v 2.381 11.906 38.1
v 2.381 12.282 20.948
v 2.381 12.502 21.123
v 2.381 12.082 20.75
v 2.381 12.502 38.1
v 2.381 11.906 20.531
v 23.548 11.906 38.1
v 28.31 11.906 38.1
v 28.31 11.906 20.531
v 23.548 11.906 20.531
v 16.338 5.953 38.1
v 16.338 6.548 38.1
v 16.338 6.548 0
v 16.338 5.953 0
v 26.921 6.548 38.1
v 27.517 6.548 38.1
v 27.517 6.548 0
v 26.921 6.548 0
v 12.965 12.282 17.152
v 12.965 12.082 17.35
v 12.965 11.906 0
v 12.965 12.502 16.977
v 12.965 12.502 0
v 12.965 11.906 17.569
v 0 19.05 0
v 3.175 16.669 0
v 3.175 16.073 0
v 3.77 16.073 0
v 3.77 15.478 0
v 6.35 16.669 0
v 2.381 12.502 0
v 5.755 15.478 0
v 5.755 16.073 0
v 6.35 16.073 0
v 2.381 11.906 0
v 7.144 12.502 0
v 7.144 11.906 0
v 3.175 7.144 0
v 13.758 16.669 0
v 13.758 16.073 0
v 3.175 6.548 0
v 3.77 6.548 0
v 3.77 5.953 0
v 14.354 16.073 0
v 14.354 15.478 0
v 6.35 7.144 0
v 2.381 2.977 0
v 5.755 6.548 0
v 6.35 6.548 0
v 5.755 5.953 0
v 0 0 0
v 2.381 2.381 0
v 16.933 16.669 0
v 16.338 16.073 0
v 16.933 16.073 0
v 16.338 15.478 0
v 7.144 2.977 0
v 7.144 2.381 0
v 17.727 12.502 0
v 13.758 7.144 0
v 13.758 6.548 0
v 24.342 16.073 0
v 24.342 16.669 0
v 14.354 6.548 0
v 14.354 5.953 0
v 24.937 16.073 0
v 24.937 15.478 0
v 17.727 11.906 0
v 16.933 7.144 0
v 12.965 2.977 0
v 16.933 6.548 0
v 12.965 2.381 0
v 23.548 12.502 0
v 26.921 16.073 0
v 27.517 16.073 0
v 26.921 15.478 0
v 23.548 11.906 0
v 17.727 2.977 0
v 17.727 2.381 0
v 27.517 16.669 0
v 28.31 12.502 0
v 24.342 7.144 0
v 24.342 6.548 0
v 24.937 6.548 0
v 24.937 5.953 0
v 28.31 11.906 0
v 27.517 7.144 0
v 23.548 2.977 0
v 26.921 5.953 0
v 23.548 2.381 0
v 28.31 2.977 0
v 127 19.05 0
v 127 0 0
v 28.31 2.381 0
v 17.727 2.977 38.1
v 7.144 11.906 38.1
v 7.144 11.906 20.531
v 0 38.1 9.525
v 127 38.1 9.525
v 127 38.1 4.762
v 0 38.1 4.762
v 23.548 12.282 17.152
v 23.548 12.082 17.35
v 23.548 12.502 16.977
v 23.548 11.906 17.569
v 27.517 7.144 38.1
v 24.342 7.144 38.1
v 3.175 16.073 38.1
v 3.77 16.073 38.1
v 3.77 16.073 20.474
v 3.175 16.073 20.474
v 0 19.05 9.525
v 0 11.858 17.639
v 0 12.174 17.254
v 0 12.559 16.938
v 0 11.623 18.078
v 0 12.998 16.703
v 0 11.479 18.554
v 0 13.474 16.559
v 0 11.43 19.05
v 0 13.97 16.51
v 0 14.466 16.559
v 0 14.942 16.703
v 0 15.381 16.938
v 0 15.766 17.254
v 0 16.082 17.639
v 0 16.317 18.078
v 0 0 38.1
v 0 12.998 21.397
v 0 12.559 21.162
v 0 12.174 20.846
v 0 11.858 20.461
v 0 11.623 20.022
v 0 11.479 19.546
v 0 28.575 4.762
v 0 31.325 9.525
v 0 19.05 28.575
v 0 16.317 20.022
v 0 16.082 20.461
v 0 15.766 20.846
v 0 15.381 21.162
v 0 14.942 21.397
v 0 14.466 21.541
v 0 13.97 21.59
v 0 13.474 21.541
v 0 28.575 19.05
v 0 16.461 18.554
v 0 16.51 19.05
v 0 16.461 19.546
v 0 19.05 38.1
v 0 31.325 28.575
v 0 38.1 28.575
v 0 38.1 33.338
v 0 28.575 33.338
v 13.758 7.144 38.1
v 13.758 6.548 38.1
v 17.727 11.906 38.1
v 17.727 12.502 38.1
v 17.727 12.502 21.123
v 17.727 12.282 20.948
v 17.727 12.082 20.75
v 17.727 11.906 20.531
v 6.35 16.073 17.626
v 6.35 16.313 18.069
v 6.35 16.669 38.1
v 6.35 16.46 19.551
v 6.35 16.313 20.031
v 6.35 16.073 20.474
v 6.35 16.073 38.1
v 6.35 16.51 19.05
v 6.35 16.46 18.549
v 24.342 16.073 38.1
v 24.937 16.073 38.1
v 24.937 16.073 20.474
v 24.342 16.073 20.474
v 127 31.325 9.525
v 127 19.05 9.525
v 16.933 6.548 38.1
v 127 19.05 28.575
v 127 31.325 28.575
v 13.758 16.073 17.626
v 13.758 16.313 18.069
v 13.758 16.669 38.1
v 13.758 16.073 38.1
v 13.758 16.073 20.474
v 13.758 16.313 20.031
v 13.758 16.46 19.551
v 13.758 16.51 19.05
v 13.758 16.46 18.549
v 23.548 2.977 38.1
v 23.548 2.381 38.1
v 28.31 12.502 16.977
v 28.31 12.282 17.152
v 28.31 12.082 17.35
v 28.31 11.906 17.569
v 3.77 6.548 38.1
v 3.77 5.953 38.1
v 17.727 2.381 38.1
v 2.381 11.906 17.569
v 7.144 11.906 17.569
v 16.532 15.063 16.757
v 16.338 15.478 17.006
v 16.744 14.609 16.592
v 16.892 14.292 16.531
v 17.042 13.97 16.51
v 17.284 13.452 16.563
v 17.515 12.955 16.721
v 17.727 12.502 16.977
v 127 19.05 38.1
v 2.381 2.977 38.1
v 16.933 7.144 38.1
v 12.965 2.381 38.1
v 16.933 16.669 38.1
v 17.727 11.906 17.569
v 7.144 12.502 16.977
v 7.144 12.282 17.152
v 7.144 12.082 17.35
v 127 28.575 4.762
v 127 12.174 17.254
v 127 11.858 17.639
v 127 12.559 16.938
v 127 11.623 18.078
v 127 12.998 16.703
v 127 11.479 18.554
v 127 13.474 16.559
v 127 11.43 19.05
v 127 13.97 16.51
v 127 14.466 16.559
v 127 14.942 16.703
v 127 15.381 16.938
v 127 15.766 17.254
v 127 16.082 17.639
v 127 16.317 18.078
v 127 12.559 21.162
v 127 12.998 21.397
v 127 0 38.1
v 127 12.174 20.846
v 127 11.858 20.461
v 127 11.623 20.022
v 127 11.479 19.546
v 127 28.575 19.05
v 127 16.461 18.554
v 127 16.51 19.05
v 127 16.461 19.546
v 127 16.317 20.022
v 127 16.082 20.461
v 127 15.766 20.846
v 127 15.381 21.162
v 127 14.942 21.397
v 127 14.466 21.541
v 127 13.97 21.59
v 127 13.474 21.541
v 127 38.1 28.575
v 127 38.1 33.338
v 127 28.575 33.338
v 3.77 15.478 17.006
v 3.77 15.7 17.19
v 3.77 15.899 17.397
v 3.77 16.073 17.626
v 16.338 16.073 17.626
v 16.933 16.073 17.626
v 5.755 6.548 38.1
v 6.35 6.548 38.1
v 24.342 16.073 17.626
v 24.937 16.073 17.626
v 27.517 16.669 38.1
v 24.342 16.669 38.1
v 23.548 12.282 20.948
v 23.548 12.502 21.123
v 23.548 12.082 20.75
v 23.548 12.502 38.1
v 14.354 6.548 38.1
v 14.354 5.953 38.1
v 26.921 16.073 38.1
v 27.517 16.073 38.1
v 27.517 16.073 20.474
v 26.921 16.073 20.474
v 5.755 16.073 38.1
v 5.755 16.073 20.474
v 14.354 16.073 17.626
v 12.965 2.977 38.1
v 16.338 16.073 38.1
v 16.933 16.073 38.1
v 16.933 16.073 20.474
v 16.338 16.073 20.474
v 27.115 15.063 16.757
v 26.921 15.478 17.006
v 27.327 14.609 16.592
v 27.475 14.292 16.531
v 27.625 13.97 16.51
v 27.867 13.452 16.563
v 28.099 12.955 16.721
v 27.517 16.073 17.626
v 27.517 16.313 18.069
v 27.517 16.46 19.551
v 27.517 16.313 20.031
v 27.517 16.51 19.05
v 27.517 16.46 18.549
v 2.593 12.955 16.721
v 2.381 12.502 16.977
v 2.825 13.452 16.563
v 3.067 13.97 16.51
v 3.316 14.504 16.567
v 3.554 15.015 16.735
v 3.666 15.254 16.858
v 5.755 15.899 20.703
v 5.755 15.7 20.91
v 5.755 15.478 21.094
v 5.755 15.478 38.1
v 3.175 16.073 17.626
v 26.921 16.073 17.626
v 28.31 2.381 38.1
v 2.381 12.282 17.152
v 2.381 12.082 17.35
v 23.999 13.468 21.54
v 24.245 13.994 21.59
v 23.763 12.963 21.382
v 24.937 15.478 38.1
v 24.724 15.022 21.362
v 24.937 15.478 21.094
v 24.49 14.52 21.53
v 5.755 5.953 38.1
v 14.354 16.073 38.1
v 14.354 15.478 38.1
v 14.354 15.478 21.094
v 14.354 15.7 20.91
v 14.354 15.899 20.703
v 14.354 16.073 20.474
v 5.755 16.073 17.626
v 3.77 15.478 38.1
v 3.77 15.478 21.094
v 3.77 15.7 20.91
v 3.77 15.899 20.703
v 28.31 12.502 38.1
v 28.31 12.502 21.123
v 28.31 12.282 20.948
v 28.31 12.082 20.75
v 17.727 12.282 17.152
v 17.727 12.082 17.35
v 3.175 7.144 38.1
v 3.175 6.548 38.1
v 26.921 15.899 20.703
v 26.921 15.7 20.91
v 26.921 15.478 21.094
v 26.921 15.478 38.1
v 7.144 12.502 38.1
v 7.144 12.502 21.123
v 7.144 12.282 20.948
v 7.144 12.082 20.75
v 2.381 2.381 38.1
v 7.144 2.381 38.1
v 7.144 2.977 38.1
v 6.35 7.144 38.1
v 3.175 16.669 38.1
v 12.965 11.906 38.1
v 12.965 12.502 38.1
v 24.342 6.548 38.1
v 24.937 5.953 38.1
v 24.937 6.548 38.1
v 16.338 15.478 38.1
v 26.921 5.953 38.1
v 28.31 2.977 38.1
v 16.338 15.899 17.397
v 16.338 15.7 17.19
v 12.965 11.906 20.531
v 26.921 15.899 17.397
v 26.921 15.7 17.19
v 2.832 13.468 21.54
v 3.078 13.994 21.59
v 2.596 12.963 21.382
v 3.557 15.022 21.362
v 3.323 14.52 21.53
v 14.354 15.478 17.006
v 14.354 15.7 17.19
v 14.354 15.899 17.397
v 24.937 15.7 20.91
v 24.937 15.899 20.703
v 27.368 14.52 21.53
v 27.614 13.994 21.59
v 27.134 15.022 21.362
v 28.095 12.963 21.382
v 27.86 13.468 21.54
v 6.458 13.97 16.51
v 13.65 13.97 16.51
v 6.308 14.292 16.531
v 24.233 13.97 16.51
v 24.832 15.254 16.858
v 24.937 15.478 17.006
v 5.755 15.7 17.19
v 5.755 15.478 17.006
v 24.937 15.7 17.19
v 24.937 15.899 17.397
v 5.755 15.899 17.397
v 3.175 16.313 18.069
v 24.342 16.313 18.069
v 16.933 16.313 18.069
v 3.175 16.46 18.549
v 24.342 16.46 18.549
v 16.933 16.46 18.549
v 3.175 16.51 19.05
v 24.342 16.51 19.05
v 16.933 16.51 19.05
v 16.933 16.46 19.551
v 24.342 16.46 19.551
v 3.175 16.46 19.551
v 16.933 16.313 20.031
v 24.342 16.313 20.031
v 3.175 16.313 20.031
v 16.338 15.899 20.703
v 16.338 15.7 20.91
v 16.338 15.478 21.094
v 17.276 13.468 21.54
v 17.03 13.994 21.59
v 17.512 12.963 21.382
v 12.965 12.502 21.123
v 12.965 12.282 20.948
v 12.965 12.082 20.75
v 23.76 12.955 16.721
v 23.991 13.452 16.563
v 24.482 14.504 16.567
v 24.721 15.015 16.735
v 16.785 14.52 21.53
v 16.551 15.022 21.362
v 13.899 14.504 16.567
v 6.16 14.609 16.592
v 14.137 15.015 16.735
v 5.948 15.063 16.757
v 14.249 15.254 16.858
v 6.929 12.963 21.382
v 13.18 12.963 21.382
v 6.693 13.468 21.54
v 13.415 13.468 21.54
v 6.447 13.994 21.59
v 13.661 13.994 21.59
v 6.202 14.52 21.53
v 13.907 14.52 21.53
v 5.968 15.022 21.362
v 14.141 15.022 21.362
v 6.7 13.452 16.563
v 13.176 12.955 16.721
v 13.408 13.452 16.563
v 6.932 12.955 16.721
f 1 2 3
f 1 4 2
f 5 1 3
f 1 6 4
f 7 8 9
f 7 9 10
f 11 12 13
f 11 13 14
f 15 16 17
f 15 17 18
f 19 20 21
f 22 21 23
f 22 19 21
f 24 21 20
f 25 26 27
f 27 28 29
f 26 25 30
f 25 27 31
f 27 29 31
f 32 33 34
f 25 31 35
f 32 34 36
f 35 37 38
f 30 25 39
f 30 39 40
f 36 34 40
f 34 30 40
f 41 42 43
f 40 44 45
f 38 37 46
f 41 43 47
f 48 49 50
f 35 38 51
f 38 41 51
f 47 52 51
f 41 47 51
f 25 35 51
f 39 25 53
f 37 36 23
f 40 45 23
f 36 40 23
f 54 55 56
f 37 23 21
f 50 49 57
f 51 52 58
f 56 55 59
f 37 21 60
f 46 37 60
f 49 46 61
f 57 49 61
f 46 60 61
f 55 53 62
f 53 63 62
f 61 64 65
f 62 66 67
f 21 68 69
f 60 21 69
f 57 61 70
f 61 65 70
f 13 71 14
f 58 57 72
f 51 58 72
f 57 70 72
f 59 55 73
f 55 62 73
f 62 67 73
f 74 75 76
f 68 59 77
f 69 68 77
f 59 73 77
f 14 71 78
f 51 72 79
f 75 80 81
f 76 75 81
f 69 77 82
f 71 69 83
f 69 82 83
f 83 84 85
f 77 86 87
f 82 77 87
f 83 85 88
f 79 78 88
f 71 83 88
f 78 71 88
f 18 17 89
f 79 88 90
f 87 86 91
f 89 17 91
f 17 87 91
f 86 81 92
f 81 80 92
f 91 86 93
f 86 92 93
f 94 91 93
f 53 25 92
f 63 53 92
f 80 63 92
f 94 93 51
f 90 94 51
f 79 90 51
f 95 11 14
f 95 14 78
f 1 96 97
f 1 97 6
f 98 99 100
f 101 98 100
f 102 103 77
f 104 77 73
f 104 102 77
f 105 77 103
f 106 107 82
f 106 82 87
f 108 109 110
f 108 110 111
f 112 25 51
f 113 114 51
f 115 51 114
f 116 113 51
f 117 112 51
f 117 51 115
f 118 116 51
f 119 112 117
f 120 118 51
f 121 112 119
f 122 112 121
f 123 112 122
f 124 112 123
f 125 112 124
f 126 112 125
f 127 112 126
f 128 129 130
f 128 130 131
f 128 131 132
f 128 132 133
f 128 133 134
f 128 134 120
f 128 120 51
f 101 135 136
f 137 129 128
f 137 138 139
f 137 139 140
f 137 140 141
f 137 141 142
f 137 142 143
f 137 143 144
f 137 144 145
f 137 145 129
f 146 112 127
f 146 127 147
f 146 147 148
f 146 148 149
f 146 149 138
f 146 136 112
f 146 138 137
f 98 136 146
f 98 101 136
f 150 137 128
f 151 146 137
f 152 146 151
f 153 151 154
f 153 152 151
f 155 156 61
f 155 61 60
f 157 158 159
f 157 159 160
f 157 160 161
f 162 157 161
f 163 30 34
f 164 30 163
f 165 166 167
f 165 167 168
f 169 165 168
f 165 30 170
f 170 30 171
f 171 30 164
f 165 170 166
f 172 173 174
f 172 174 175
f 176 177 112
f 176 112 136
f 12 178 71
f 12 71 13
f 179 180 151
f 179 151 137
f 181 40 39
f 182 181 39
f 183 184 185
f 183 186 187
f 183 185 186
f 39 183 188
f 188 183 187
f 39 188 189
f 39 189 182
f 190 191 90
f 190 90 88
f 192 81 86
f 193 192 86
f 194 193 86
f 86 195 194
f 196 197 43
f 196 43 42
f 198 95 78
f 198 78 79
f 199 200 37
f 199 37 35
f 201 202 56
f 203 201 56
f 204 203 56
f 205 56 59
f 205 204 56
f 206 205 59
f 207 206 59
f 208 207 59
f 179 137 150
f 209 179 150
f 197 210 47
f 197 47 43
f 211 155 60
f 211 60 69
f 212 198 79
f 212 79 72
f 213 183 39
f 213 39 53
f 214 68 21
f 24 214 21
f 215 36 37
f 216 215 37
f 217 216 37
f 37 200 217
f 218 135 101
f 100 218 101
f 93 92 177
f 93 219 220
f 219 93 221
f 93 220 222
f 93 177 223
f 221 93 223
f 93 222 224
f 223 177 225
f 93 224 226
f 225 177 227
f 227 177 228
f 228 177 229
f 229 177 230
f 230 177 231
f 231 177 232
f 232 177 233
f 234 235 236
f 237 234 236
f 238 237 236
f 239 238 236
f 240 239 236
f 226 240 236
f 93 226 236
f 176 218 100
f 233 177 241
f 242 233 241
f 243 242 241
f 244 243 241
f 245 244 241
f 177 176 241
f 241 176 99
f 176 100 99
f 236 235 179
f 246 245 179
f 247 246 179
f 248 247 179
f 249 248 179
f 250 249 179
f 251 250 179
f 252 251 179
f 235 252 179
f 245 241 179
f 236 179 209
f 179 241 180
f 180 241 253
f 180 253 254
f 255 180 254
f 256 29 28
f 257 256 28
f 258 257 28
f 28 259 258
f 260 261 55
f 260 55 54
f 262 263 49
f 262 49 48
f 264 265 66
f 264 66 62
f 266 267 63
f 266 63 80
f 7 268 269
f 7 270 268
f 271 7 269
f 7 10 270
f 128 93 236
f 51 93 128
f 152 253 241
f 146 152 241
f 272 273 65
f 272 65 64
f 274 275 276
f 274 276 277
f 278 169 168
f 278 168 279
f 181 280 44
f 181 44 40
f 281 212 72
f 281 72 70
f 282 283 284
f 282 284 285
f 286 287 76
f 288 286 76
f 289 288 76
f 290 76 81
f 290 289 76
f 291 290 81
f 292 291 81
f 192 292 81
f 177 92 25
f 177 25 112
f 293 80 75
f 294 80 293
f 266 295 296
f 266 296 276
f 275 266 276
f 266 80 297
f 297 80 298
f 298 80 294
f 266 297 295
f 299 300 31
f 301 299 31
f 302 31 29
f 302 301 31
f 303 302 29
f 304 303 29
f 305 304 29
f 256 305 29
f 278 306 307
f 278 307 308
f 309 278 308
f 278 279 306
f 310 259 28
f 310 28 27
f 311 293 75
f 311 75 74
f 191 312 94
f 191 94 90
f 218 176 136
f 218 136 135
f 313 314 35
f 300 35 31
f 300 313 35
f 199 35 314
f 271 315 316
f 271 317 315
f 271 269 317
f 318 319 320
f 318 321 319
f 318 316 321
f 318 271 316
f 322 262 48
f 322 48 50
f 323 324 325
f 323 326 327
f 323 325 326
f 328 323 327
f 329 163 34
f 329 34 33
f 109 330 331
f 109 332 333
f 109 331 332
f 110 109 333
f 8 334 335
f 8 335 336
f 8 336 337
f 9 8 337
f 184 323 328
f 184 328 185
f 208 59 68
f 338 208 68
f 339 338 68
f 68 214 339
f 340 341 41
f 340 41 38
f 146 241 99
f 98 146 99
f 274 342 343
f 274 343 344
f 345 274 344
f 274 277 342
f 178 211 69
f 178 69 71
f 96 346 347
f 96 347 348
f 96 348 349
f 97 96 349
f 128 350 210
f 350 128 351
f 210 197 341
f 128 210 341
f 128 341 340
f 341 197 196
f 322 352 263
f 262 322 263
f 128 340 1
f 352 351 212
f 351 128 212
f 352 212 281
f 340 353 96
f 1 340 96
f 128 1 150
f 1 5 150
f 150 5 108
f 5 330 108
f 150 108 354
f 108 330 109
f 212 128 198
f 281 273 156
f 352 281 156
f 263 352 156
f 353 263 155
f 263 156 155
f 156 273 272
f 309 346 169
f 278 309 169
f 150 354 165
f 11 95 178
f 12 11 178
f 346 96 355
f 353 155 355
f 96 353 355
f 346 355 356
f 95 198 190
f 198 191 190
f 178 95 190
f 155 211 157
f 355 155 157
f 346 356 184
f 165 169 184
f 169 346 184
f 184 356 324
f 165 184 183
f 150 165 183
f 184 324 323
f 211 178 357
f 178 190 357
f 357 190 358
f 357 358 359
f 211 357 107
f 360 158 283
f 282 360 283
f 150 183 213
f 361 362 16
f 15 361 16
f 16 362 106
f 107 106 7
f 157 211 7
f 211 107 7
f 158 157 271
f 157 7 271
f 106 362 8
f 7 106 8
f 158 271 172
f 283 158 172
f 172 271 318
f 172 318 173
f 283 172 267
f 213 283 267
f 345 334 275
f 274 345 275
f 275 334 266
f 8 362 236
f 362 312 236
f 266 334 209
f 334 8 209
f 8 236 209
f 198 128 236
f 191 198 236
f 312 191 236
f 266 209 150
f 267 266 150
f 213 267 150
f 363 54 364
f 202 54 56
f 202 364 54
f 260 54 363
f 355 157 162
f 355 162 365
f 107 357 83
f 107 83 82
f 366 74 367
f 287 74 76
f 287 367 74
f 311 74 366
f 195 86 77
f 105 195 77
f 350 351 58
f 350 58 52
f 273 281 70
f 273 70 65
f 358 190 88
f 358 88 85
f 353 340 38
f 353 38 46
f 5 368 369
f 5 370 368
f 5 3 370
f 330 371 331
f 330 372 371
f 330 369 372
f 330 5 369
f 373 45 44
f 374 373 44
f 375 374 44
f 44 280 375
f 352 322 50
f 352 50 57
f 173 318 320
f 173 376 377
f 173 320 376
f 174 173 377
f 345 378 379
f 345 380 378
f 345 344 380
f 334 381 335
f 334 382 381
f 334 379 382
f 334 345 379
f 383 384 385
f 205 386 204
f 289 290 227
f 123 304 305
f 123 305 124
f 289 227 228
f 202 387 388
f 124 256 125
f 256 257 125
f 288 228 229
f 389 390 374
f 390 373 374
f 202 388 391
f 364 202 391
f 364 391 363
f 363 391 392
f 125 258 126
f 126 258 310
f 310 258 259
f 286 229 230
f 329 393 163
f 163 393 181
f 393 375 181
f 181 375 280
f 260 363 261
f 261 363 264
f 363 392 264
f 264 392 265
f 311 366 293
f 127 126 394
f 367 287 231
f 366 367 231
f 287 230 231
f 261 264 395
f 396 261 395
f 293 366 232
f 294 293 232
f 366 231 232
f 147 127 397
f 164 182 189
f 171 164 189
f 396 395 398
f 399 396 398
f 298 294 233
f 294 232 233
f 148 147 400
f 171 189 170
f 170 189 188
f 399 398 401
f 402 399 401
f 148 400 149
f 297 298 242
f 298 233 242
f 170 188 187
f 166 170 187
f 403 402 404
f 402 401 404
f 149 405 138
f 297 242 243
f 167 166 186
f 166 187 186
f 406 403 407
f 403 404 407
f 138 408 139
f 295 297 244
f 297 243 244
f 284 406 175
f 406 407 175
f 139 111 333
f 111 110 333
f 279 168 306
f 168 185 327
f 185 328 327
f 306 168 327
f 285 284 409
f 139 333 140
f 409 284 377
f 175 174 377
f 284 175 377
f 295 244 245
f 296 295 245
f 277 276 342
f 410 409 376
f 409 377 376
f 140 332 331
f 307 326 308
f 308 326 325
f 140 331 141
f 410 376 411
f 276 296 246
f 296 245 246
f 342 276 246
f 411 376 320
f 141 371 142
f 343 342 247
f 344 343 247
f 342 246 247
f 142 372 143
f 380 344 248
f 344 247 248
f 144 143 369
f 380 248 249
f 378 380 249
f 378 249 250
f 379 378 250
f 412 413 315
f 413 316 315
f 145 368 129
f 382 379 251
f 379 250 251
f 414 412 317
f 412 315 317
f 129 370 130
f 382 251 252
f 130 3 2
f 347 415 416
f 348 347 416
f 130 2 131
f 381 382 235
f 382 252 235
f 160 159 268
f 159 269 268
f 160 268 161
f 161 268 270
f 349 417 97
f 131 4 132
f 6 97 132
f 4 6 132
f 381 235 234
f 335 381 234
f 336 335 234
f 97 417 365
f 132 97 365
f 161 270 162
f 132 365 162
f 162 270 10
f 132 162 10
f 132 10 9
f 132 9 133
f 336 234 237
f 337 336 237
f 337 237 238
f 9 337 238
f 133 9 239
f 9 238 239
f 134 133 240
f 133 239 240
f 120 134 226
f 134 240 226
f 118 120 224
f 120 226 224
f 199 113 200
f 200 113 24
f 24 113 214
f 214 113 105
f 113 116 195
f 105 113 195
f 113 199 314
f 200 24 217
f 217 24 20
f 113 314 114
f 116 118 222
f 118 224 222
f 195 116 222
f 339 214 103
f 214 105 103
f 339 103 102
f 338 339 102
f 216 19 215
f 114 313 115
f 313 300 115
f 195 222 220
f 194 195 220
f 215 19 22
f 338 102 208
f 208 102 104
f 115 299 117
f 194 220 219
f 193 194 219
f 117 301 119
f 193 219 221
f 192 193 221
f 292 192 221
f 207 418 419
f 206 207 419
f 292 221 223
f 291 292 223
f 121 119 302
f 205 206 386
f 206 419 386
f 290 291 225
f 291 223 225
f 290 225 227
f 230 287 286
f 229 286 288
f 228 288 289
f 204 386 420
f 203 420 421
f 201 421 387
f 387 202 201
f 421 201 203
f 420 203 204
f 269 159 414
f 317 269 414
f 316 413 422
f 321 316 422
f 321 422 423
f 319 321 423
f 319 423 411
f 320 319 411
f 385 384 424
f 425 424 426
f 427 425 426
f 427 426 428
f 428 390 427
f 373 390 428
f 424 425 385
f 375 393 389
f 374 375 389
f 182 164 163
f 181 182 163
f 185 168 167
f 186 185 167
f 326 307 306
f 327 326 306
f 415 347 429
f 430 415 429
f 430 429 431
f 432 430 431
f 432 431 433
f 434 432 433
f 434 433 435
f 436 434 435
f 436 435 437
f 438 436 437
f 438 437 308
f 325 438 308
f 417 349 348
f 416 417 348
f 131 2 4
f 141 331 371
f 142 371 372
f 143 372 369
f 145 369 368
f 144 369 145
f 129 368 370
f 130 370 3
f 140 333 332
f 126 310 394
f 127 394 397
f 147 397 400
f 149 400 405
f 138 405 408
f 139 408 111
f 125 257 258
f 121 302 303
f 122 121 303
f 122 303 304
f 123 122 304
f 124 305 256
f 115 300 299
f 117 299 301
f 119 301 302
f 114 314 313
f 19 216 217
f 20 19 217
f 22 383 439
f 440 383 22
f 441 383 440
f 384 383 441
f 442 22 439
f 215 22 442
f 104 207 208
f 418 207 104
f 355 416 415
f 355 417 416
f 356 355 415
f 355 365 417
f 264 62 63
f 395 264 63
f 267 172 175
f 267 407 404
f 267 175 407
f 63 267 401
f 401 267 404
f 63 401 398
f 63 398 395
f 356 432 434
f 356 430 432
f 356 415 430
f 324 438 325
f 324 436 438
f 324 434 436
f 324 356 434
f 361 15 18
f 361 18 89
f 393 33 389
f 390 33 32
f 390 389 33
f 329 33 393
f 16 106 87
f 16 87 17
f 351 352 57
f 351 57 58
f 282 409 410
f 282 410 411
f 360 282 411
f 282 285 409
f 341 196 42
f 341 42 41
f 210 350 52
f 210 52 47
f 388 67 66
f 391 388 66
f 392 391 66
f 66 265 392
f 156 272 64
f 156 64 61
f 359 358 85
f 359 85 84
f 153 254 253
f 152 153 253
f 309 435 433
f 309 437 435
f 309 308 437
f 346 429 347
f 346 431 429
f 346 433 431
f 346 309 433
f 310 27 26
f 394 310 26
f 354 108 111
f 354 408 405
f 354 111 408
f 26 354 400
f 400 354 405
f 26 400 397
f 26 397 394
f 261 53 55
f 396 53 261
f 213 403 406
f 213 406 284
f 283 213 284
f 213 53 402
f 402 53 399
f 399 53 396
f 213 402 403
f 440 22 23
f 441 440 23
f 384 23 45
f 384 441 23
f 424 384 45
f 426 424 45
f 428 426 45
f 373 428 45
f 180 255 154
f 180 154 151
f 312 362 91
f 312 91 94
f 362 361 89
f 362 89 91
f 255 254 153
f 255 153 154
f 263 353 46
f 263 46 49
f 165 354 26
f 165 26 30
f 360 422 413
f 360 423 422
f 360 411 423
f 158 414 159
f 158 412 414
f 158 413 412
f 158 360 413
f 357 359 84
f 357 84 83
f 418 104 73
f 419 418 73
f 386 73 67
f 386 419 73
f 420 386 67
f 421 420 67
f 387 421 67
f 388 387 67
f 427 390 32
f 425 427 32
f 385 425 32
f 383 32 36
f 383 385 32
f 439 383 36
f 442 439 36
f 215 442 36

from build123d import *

# Parameters (mm, degrees)
BOSS_EXTRUDE2_DEPTH  = 19.05
BOSS_EXTRUDE1_DEPTH  = 127
SKETCH6_R            = 2.54
CUT_EXTRUDE2_DEPTH   = 128
CUT_EXTRUDE3_DEPTH   = 128
CUT_EXTRUDE4_DEPTH   = 39.1
LPATTERN1_COUNT      = 3
LPATTERN1_PITCH      = 10.583333333
LPATTERN1_COUNT_DIR2 = 2
LPATTERN1_PITCH_DIR2 = 9.525


with BuildPart() as part:
    # Base → Boss-Extrude2 (new body)
    with BuildSketch(Plane(origin=(0, 0, 0), x_dir=(1, 0, 0), z_dir=(0, 1, 0))):
        Polygon((0, 0), (63.5, 0), (122.112570575, 0), (127, 0), (127, -38.1), (31.75, -38.1), (0, -38.1), align=None)
    extrude(amount=BOSS_EXTRUDE2_DEPTH)

    # Sketch3 → Boss-Extrude1 (add)
    with BuildSketch(Plane(origin=(127, 0, 0), x_dir=(0, 0, -1), z_dir=(1, 0, 0))):
        Polygon((-38.1, 38.1), (-28.575, 38.1), (-19.05, 28.575), (-9.525, 38.1), (0, 38.1), (0, 0), (-38.1, 0), align=None)
    extrude(amount=-BOSS_EXTRUDE1_DEPTH)

    # Sketch6 → Cut-Extrude2 (cut, through all)
    with BuildSketch(Plane(origin=(127, 0, 0), x_dir=(0, 0, -1), z_dir=(1, 0, 0))):
        with Locations((-19.05, 13.97)):
            Circle(SKETCH6_R)
    extrude(amount=-CUT_EXTRUDE2_DEPTH, mode=Mode.SUBTRACT)

    # Sketch8 → Cut-Extrude3 (cut, through all)
    with BuildSketch(Plane(origin=(127, 0, 0), x_dir=(0, 0, -1), z_dir=(1, 0, 0))):
        Polygon((-4.7625, 28.575), (-4.7625, 38.1), (0, 38.1), (0, 19.05), (-9.525, 19.05), (-9.525, 31.324630657), align=None)
        Polygon((-28.575, 19.05), (-38.1, 19.05), (-38.1, 38.1), (-33.3375, 38.1), (-33.3375, 28.575), (-28.575, 31.324630657), align=None)
    extrude(amount=-CUT_EXTRUDE3_DEPTH, mode=Mode.SUBTRACT)

    # Sketch9 → Cut-Extrude4 (cut, through all)
    with BuildSketch(Plane.XY.offset(38.1)):
        Polygon((3.175, 16.66875), (6.35, 16.66875), (6.35, 16.0734375), (5.7546875, 16.0734375), (5.7546875, 15.478125), (7.14375, 12.5015625), (7.14375, 11.90625), (2.38125, 11.90625), (2.38125, 12.5015625), (3.7703125, 15.478125), (3.7703125, 16.0734375), (3.175, 16.0734375), align=None)
    cut_extrude4 = extrude(amount=-CUT_EXTRUDE4_DEPTH, mode=Mode.SUBTRACT)

    # LPattern1: Cut-Extrude4 3 × 2
    with Locations(*[(i * LPATTERN1_PITCH, -j * LPATTERN1_PITCH_DIR2, 0) for i in range(LPATTERN1_COUNT) for j in range(LPATTERN1_COUNT_DIR2) if (i, j) != (0, 0)]):
        add(cut_extrude4, mode=Mode.SUBTRACT)


solid = part.part
